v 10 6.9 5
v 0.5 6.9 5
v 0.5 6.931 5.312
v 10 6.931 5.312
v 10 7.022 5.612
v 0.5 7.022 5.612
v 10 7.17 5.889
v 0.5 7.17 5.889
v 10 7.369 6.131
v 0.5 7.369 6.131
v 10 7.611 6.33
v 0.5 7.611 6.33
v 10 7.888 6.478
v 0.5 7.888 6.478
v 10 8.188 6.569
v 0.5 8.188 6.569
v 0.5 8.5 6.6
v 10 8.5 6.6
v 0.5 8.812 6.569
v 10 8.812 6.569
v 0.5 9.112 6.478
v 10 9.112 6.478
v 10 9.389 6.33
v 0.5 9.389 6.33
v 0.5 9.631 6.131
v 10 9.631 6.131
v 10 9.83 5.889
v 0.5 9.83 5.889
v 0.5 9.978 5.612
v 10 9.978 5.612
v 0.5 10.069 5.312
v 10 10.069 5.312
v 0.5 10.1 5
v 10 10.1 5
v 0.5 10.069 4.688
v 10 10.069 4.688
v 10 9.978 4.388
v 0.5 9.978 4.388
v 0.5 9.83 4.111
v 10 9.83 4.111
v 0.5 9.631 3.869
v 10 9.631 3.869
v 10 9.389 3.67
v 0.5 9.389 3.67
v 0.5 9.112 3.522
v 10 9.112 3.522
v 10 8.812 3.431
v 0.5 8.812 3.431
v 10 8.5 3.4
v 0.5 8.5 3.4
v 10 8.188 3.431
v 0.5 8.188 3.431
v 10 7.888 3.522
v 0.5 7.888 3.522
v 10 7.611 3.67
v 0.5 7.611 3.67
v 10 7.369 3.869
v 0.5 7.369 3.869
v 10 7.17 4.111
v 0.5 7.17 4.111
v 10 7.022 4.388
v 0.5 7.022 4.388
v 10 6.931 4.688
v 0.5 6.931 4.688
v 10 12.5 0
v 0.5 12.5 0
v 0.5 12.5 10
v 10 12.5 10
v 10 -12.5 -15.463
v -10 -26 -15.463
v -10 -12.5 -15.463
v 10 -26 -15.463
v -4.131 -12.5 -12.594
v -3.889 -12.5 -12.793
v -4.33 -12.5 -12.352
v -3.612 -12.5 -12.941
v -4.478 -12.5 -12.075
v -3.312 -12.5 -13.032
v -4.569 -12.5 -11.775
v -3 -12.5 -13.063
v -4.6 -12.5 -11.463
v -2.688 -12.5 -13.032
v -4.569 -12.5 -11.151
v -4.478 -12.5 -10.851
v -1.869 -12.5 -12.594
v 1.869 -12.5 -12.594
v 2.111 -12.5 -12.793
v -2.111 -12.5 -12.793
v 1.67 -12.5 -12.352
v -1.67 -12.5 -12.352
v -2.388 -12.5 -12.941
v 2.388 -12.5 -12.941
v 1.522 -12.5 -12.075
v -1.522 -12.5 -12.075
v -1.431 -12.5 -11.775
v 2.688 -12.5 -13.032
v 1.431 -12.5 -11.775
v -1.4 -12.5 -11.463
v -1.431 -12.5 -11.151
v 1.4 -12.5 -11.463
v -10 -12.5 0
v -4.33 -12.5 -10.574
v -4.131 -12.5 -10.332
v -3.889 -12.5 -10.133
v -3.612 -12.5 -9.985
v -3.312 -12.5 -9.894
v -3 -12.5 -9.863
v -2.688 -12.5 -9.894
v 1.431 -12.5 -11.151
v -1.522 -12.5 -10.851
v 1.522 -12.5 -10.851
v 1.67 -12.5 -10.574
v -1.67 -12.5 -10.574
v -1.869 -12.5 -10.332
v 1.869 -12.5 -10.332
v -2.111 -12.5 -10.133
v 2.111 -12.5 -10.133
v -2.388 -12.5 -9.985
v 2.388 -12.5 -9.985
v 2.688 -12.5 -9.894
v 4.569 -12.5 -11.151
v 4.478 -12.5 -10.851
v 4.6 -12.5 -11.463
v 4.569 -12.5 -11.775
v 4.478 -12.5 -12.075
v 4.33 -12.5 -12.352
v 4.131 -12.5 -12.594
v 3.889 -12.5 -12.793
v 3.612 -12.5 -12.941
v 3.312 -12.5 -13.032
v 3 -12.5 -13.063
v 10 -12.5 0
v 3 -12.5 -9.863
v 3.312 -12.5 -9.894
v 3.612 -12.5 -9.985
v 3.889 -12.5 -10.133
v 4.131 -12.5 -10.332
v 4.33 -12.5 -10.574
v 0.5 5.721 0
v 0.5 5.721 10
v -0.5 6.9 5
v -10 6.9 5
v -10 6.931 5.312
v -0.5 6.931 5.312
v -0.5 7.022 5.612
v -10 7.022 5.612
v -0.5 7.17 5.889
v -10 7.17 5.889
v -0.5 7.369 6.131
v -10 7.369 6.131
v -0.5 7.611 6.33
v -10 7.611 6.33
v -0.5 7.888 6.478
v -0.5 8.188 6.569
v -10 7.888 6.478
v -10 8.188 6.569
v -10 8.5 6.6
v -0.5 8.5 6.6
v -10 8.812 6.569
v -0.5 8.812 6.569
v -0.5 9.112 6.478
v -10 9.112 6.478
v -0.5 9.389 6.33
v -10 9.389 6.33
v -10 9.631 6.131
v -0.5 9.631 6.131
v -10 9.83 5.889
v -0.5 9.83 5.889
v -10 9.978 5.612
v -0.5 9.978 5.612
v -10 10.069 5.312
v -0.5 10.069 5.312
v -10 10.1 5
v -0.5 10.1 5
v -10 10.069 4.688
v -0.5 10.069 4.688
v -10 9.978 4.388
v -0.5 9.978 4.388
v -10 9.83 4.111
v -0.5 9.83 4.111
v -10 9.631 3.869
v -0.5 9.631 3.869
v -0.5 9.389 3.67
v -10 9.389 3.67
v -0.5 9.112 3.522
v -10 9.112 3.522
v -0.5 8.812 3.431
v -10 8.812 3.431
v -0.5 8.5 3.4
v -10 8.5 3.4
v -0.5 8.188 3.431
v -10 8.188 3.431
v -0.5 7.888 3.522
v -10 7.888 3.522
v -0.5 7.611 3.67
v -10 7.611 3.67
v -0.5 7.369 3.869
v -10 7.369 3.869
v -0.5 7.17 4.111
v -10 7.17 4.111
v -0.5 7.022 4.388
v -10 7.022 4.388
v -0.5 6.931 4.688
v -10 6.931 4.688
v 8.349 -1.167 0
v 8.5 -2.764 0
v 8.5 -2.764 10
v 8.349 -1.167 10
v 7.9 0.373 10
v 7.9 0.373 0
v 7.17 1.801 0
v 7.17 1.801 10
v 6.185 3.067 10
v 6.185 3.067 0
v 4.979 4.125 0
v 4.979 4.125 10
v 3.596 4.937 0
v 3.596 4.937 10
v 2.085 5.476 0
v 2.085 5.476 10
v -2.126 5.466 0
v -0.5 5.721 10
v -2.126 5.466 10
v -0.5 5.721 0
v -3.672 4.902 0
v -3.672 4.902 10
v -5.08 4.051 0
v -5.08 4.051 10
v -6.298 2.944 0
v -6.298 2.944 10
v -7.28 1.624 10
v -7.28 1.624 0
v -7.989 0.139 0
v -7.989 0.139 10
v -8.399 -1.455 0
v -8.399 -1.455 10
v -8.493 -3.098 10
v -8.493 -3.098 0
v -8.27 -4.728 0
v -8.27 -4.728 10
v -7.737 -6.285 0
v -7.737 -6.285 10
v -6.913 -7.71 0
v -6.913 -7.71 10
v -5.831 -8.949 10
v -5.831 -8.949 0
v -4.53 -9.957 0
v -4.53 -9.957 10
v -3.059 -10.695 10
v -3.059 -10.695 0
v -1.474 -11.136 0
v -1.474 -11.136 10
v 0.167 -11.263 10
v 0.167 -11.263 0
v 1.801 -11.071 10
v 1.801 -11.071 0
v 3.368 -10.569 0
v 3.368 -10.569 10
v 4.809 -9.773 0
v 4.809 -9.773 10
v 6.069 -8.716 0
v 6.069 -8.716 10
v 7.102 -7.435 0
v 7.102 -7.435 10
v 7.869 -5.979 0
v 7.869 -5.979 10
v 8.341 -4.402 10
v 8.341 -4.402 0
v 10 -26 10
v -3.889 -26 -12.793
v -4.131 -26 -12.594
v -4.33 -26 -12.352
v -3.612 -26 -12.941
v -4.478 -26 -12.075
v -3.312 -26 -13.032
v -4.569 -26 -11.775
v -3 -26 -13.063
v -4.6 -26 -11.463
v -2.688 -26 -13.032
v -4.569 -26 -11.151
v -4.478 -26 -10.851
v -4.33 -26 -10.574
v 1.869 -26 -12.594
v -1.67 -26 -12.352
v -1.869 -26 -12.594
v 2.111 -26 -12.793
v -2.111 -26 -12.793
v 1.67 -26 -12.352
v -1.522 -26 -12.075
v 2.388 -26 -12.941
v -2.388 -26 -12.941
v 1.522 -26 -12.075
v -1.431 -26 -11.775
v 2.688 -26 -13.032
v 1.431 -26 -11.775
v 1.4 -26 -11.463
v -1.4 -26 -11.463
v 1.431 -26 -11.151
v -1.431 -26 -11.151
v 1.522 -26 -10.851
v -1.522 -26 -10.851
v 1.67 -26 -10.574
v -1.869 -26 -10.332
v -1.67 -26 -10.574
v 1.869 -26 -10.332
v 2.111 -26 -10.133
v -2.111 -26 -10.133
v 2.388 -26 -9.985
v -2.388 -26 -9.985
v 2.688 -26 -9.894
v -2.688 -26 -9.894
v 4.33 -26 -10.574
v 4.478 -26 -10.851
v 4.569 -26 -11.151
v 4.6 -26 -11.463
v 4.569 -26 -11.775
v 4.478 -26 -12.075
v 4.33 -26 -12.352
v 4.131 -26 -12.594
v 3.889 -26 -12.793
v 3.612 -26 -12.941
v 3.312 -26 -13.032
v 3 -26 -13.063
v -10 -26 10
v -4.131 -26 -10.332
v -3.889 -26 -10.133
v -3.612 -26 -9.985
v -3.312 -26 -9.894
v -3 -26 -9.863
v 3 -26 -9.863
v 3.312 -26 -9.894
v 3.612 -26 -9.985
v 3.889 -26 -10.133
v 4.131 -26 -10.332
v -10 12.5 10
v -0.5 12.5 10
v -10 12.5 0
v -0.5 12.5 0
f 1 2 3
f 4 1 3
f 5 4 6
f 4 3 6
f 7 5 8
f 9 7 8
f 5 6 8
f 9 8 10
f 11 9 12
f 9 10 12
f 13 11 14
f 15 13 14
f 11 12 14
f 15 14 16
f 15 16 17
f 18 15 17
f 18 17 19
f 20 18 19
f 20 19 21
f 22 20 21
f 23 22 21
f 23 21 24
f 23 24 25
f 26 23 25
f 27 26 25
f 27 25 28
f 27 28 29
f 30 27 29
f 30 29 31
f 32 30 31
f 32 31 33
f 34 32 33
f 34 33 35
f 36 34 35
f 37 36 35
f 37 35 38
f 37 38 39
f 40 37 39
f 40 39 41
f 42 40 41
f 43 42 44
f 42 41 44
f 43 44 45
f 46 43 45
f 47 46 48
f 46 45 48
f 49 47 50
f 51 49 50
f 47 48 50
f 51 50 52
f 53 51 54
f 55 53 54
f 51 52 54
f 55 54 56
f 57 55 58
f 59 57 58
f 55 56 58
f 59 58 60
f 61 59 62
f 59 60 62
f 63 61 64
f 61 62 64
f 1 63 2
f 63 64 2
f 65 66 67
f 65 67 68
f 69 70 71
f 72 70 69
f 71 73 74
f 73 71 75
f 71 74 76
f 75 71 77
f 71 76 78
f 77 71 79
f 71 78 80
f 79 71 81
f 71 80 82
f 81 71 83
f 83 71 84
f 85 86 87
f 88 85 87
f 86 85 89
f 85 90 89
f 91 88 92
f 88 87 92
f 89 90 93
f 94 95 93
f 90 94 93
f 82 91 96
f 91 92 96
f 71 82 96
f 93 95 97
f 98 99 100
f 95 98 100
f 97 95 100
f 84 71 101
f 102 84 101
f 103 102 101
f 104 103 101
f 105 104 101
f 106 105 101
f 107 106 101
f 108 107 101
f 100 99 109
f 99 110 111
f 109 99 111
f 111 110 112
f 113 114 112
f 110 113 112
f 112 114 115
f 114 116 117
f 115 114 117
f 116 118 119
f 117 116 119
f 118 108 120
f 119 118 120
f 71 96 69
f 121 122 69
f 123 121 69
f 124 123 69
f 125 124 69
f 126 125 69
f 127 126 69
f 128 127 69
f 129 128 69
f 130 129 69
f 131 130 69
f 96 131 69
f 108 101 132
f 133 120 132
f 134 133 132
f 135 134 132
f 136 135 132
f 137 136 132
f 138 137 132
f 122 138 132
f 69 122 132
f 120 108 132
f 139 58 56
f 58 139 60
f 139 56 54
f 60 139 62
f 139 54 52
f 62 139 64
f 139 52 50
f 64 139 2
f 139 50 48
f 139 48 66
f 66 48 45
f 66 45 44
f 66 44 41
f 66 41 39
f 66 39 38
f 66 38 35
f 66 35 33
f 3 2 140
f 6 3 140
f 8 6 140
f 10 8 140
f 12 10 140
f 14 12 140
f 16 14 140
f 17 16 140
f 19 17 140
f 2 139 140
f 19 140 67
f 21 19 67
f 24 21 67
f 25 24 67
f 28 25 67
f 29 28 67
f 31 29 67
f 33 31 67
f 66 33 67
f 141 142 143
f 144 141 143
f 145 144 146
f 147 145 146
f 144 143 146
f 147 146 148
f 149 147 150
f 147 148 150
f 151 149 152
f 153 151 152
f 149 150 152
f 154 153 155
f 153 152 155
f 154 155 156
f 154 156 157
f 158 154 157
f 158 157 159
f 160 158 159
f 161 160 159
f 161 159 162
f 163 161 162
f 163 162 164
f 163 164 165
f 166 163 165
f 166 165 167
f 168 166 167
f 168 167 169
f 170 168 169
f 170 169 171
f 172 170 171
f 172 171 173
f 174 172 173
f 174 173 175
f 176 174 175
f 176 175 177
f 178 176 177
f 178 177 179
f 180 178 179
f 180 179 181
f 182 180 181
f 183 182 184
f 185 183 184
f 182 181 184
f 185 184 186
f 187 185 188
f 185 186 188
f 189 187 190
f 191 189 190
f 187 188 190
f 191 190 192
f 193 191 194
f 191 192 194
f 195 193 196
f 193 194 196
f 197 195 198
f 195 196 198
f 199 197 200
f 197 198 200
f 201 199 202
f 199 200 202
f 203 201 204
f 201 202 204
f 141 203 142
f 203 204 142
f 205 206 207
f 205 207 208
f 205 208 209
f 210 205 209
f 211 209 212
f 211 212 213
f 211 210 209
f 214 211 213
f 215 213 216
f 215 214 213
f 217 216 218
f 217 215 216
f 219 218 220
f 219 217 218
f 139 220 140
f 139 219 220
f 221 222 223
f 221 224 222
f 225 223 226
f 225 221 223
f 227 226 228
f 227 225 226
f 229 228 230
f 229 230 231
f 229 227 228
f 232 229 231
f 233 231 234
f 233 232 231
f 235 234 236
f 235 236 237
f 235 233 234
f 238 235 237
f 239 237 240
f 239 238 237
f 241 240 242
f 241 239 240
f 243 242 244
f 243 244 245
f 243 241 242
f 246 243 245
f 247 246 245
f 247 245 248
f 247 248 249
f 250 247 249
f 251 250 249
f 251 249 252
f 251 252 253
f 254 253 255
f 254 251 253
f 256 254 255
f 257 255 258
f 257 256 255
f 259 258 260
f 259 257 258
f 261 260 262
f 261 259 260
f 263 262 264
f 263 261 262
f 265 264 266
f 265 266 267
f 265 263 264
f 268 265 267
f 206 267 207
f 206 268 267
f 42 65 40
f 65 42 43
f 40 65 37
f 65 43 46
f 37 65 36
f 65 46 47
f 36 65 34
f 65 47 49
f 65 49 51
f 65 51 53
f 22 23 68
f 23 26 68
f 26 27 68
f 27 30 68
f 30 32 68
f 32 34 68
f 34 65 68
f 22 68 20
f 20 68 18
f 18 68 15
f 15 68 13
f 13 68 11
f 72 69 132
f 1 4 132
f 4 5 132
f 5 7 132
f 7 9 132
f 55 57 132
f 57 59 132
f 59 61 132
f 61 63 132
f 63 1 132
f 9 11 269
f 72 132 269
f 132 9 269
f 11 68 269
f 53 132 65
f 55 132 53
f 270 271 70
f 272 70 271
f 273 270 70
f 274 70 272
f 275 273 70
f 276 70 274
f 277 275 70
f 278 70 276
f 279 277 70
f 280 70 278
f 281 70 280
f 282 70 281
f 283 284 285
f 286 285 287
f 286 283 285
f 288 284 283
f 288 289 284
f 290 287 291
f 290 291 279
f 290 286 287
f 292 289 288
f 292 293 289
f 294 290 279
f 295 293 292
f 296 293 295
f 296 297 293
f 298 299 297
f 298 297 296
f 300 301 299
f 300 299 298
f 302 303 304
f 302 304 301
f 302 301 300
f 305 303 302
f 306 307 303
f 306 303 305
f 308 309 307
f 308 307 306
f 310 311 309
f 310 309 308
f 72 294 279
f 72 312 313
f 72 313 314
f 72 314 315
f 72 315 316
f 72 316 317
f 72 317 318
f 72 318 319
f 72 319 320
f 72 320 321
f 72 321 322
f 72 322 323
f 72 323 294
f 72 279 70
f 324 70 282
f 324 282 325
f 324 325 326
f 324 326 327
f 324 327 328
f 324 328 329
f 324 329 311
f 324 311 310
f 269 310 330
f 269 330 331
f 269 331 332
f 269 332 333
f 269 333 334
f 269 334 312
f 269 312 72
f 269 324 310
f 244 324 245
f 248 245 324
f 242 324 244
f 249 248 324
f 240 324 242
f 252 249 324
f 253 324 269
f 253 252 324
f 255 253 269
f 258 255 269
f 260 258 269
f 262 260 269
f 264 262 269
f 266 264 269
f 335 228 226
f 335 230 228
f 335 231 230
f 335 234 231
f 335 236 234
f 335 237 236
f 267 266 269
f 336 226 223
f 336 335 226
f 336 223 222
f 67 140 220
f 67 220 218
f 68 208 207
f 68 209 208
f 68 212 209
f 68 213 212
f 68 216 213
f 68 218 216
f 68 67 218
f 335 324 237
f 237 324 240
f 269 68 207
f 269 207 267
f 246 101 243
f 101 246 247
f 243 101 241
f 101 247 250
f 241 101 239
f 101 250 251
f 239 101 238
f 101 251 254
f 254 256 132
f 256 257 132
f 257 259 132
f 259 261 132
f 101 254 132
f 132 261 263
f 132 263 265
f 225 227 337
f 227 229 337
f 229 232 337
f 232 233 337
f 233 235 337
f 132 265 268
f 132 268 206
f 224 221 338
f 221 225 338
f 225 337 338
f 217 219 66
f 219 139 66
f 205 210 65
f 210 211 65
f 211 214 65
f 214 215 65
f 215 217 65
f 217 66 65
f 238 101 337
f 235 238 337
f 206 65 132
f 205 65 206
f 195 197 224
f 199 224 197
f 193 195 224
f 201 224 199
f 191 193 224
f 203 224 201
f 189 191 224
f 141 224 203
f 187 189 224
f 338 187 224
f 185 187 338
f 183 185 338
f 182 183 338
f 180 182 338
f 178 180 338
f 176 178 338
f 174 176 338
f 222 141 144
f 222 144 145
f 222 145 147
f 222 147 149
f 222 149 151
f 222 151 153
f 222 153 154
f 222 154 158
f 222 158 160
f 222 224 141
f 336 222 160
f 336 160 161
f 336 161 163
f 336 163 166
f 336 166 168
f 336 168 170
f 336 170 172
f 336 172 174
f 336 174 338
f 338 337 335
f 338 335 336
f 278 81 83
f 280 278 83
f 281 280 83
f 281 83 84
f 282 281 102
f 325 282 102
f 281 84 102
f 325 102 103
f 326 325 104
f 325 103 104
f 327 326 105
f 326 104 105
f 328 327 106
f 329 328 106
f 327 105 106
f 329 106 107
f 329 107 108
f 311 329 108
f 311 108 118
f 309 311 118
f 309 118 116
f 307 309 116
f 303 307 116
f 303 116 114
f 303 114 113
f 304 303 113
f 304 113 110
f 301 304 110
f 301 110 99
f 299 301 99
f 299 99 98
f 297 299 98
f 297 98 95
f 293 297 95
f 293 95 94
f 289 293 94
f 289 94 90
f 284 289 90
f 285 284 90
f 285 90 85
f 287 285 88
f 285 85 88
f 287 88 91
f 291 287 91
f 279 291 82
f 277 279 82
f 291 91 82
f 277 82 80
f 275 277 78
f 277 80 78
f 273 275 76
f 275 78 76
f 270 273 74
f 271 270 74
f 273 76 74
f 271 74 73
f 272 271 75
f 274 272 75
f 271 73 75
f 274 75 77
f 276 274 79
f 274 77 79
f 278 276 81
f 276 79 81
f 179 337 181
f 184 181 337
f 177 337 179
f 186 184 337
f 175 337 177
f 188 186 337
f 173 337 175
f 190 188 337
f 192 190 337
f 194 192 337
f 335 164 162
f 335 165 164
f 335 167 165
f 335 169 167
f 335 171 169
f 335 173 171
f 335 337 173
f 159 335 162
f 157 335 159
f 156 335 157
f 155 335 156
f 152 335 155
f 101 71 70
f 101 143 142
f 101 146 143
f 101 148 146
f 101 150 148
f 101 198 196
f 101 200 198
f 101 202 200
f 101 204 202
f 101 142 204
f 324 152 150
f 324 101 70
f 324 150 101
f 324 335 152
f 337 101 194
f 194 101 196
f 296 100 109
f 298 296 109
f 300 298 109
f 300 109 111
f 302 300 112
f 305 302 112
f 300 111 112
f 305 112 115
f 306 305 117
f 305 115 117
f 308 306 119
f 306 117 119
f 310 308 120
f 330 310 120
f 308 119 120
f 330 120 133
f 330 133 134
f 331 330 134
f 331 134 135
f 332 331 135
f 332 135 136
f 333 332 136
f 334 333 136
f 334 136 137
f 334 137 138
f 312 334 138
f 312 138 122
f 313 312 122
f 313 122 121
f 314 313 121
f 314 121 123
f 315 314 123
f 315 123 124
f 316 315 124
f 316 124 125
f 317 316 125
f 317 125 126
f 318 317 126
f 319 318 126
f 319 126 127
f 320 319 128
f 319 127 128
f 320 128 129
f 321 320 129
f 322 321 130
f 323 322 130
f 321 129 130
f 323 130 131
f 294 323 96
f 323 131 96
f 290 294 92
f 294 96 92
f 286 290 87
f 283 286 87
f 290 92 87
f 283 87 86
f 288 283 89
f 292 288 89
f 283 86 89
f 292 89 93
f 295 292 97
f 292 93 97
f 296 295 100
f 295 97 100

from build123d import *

# Parameters (mm, degrees)
F0_W      = 20
F0_H      = 25
F0_R      = 8.5
F1_DEPTH  = 10
F2_W      = 1
F2_H      = 6.779089
F3_DEPTH  = 10
F4_R      = 1.6
F5_DEPTH  = 20
F6_W      = 20
F6_H      = 10.463078
F7_DEPTH  = 13.5
F8_W      = 20
F8_H      = 13.5
F9_DEPTH  = 15
F10_R     = 1.6
F11_DEPTH = 14


with BuildPart() as f1:
    # F0 (on Top) → F1 (new body)
    with BuildSketch(Plane.XY):
        Rectangle(F0_W, F0_H)
        with Locations((0, -2.764371)):
            Circle(F0_R, mode=Mode.SUBTRACT)
    extrude(amount=F1_DEPTH)

    # F2 (on face) → F3 (cut)
    with BuildSketch(Plane.XY.offset(10)):
        with Locations((0, 9.110456)):
            Rectangle(F2_W, F2_H)
    extrude(amount=-F3_DEPTH, mode=Mode.SUBTRACT)

    # F4 (on face) → F5 (cut)
    with BuildSketch(Plane(origin=(-10, 0, 0), x_dir=(0, -1, 0), z_dir=(-1, 0, 0))):
        with Locations((-8.5, 5)):
            Circle(F4_R)
    extrude(amount=-F5_DEPTH, mode=Mode.SUBTRACT)

    # F6 (on face) → F7 (join)
    with BuildSketch(Plane.XZ.offset(12.5)):
        with Locations((0, 4.768461)):
            Rectangle(F6_W, F6_H)
    extrude(amount=F7_DEPTH)

    # F8 (on face) → F9 (join)
    with BuildSketch(Plane(origin=(0, 0, -0.463078), x_dir=(1, 0, 0), z_dir=(0, 0, -1))):
        with Locations((0, 19.25)):
            Rectangle(F8_W, F8_H)
    extrude(amount=F9_DEPTH)

    # F10 (on face) → F11 (cut)
    with BuildSketch(Plane(origin=(0, -12.5, 0), x_dir=(-1, 0, 0), z_dir=(0, 1, 0))):
        with Locations((-3, -11.463078)):
            Circle(F10_R)
        with Locations((3, -11.463078)):
            Circle(F10_R)
    extrude(amount=-F11_DEPTH, mode=Mode.SUBTRACT)


solid = f1.part
